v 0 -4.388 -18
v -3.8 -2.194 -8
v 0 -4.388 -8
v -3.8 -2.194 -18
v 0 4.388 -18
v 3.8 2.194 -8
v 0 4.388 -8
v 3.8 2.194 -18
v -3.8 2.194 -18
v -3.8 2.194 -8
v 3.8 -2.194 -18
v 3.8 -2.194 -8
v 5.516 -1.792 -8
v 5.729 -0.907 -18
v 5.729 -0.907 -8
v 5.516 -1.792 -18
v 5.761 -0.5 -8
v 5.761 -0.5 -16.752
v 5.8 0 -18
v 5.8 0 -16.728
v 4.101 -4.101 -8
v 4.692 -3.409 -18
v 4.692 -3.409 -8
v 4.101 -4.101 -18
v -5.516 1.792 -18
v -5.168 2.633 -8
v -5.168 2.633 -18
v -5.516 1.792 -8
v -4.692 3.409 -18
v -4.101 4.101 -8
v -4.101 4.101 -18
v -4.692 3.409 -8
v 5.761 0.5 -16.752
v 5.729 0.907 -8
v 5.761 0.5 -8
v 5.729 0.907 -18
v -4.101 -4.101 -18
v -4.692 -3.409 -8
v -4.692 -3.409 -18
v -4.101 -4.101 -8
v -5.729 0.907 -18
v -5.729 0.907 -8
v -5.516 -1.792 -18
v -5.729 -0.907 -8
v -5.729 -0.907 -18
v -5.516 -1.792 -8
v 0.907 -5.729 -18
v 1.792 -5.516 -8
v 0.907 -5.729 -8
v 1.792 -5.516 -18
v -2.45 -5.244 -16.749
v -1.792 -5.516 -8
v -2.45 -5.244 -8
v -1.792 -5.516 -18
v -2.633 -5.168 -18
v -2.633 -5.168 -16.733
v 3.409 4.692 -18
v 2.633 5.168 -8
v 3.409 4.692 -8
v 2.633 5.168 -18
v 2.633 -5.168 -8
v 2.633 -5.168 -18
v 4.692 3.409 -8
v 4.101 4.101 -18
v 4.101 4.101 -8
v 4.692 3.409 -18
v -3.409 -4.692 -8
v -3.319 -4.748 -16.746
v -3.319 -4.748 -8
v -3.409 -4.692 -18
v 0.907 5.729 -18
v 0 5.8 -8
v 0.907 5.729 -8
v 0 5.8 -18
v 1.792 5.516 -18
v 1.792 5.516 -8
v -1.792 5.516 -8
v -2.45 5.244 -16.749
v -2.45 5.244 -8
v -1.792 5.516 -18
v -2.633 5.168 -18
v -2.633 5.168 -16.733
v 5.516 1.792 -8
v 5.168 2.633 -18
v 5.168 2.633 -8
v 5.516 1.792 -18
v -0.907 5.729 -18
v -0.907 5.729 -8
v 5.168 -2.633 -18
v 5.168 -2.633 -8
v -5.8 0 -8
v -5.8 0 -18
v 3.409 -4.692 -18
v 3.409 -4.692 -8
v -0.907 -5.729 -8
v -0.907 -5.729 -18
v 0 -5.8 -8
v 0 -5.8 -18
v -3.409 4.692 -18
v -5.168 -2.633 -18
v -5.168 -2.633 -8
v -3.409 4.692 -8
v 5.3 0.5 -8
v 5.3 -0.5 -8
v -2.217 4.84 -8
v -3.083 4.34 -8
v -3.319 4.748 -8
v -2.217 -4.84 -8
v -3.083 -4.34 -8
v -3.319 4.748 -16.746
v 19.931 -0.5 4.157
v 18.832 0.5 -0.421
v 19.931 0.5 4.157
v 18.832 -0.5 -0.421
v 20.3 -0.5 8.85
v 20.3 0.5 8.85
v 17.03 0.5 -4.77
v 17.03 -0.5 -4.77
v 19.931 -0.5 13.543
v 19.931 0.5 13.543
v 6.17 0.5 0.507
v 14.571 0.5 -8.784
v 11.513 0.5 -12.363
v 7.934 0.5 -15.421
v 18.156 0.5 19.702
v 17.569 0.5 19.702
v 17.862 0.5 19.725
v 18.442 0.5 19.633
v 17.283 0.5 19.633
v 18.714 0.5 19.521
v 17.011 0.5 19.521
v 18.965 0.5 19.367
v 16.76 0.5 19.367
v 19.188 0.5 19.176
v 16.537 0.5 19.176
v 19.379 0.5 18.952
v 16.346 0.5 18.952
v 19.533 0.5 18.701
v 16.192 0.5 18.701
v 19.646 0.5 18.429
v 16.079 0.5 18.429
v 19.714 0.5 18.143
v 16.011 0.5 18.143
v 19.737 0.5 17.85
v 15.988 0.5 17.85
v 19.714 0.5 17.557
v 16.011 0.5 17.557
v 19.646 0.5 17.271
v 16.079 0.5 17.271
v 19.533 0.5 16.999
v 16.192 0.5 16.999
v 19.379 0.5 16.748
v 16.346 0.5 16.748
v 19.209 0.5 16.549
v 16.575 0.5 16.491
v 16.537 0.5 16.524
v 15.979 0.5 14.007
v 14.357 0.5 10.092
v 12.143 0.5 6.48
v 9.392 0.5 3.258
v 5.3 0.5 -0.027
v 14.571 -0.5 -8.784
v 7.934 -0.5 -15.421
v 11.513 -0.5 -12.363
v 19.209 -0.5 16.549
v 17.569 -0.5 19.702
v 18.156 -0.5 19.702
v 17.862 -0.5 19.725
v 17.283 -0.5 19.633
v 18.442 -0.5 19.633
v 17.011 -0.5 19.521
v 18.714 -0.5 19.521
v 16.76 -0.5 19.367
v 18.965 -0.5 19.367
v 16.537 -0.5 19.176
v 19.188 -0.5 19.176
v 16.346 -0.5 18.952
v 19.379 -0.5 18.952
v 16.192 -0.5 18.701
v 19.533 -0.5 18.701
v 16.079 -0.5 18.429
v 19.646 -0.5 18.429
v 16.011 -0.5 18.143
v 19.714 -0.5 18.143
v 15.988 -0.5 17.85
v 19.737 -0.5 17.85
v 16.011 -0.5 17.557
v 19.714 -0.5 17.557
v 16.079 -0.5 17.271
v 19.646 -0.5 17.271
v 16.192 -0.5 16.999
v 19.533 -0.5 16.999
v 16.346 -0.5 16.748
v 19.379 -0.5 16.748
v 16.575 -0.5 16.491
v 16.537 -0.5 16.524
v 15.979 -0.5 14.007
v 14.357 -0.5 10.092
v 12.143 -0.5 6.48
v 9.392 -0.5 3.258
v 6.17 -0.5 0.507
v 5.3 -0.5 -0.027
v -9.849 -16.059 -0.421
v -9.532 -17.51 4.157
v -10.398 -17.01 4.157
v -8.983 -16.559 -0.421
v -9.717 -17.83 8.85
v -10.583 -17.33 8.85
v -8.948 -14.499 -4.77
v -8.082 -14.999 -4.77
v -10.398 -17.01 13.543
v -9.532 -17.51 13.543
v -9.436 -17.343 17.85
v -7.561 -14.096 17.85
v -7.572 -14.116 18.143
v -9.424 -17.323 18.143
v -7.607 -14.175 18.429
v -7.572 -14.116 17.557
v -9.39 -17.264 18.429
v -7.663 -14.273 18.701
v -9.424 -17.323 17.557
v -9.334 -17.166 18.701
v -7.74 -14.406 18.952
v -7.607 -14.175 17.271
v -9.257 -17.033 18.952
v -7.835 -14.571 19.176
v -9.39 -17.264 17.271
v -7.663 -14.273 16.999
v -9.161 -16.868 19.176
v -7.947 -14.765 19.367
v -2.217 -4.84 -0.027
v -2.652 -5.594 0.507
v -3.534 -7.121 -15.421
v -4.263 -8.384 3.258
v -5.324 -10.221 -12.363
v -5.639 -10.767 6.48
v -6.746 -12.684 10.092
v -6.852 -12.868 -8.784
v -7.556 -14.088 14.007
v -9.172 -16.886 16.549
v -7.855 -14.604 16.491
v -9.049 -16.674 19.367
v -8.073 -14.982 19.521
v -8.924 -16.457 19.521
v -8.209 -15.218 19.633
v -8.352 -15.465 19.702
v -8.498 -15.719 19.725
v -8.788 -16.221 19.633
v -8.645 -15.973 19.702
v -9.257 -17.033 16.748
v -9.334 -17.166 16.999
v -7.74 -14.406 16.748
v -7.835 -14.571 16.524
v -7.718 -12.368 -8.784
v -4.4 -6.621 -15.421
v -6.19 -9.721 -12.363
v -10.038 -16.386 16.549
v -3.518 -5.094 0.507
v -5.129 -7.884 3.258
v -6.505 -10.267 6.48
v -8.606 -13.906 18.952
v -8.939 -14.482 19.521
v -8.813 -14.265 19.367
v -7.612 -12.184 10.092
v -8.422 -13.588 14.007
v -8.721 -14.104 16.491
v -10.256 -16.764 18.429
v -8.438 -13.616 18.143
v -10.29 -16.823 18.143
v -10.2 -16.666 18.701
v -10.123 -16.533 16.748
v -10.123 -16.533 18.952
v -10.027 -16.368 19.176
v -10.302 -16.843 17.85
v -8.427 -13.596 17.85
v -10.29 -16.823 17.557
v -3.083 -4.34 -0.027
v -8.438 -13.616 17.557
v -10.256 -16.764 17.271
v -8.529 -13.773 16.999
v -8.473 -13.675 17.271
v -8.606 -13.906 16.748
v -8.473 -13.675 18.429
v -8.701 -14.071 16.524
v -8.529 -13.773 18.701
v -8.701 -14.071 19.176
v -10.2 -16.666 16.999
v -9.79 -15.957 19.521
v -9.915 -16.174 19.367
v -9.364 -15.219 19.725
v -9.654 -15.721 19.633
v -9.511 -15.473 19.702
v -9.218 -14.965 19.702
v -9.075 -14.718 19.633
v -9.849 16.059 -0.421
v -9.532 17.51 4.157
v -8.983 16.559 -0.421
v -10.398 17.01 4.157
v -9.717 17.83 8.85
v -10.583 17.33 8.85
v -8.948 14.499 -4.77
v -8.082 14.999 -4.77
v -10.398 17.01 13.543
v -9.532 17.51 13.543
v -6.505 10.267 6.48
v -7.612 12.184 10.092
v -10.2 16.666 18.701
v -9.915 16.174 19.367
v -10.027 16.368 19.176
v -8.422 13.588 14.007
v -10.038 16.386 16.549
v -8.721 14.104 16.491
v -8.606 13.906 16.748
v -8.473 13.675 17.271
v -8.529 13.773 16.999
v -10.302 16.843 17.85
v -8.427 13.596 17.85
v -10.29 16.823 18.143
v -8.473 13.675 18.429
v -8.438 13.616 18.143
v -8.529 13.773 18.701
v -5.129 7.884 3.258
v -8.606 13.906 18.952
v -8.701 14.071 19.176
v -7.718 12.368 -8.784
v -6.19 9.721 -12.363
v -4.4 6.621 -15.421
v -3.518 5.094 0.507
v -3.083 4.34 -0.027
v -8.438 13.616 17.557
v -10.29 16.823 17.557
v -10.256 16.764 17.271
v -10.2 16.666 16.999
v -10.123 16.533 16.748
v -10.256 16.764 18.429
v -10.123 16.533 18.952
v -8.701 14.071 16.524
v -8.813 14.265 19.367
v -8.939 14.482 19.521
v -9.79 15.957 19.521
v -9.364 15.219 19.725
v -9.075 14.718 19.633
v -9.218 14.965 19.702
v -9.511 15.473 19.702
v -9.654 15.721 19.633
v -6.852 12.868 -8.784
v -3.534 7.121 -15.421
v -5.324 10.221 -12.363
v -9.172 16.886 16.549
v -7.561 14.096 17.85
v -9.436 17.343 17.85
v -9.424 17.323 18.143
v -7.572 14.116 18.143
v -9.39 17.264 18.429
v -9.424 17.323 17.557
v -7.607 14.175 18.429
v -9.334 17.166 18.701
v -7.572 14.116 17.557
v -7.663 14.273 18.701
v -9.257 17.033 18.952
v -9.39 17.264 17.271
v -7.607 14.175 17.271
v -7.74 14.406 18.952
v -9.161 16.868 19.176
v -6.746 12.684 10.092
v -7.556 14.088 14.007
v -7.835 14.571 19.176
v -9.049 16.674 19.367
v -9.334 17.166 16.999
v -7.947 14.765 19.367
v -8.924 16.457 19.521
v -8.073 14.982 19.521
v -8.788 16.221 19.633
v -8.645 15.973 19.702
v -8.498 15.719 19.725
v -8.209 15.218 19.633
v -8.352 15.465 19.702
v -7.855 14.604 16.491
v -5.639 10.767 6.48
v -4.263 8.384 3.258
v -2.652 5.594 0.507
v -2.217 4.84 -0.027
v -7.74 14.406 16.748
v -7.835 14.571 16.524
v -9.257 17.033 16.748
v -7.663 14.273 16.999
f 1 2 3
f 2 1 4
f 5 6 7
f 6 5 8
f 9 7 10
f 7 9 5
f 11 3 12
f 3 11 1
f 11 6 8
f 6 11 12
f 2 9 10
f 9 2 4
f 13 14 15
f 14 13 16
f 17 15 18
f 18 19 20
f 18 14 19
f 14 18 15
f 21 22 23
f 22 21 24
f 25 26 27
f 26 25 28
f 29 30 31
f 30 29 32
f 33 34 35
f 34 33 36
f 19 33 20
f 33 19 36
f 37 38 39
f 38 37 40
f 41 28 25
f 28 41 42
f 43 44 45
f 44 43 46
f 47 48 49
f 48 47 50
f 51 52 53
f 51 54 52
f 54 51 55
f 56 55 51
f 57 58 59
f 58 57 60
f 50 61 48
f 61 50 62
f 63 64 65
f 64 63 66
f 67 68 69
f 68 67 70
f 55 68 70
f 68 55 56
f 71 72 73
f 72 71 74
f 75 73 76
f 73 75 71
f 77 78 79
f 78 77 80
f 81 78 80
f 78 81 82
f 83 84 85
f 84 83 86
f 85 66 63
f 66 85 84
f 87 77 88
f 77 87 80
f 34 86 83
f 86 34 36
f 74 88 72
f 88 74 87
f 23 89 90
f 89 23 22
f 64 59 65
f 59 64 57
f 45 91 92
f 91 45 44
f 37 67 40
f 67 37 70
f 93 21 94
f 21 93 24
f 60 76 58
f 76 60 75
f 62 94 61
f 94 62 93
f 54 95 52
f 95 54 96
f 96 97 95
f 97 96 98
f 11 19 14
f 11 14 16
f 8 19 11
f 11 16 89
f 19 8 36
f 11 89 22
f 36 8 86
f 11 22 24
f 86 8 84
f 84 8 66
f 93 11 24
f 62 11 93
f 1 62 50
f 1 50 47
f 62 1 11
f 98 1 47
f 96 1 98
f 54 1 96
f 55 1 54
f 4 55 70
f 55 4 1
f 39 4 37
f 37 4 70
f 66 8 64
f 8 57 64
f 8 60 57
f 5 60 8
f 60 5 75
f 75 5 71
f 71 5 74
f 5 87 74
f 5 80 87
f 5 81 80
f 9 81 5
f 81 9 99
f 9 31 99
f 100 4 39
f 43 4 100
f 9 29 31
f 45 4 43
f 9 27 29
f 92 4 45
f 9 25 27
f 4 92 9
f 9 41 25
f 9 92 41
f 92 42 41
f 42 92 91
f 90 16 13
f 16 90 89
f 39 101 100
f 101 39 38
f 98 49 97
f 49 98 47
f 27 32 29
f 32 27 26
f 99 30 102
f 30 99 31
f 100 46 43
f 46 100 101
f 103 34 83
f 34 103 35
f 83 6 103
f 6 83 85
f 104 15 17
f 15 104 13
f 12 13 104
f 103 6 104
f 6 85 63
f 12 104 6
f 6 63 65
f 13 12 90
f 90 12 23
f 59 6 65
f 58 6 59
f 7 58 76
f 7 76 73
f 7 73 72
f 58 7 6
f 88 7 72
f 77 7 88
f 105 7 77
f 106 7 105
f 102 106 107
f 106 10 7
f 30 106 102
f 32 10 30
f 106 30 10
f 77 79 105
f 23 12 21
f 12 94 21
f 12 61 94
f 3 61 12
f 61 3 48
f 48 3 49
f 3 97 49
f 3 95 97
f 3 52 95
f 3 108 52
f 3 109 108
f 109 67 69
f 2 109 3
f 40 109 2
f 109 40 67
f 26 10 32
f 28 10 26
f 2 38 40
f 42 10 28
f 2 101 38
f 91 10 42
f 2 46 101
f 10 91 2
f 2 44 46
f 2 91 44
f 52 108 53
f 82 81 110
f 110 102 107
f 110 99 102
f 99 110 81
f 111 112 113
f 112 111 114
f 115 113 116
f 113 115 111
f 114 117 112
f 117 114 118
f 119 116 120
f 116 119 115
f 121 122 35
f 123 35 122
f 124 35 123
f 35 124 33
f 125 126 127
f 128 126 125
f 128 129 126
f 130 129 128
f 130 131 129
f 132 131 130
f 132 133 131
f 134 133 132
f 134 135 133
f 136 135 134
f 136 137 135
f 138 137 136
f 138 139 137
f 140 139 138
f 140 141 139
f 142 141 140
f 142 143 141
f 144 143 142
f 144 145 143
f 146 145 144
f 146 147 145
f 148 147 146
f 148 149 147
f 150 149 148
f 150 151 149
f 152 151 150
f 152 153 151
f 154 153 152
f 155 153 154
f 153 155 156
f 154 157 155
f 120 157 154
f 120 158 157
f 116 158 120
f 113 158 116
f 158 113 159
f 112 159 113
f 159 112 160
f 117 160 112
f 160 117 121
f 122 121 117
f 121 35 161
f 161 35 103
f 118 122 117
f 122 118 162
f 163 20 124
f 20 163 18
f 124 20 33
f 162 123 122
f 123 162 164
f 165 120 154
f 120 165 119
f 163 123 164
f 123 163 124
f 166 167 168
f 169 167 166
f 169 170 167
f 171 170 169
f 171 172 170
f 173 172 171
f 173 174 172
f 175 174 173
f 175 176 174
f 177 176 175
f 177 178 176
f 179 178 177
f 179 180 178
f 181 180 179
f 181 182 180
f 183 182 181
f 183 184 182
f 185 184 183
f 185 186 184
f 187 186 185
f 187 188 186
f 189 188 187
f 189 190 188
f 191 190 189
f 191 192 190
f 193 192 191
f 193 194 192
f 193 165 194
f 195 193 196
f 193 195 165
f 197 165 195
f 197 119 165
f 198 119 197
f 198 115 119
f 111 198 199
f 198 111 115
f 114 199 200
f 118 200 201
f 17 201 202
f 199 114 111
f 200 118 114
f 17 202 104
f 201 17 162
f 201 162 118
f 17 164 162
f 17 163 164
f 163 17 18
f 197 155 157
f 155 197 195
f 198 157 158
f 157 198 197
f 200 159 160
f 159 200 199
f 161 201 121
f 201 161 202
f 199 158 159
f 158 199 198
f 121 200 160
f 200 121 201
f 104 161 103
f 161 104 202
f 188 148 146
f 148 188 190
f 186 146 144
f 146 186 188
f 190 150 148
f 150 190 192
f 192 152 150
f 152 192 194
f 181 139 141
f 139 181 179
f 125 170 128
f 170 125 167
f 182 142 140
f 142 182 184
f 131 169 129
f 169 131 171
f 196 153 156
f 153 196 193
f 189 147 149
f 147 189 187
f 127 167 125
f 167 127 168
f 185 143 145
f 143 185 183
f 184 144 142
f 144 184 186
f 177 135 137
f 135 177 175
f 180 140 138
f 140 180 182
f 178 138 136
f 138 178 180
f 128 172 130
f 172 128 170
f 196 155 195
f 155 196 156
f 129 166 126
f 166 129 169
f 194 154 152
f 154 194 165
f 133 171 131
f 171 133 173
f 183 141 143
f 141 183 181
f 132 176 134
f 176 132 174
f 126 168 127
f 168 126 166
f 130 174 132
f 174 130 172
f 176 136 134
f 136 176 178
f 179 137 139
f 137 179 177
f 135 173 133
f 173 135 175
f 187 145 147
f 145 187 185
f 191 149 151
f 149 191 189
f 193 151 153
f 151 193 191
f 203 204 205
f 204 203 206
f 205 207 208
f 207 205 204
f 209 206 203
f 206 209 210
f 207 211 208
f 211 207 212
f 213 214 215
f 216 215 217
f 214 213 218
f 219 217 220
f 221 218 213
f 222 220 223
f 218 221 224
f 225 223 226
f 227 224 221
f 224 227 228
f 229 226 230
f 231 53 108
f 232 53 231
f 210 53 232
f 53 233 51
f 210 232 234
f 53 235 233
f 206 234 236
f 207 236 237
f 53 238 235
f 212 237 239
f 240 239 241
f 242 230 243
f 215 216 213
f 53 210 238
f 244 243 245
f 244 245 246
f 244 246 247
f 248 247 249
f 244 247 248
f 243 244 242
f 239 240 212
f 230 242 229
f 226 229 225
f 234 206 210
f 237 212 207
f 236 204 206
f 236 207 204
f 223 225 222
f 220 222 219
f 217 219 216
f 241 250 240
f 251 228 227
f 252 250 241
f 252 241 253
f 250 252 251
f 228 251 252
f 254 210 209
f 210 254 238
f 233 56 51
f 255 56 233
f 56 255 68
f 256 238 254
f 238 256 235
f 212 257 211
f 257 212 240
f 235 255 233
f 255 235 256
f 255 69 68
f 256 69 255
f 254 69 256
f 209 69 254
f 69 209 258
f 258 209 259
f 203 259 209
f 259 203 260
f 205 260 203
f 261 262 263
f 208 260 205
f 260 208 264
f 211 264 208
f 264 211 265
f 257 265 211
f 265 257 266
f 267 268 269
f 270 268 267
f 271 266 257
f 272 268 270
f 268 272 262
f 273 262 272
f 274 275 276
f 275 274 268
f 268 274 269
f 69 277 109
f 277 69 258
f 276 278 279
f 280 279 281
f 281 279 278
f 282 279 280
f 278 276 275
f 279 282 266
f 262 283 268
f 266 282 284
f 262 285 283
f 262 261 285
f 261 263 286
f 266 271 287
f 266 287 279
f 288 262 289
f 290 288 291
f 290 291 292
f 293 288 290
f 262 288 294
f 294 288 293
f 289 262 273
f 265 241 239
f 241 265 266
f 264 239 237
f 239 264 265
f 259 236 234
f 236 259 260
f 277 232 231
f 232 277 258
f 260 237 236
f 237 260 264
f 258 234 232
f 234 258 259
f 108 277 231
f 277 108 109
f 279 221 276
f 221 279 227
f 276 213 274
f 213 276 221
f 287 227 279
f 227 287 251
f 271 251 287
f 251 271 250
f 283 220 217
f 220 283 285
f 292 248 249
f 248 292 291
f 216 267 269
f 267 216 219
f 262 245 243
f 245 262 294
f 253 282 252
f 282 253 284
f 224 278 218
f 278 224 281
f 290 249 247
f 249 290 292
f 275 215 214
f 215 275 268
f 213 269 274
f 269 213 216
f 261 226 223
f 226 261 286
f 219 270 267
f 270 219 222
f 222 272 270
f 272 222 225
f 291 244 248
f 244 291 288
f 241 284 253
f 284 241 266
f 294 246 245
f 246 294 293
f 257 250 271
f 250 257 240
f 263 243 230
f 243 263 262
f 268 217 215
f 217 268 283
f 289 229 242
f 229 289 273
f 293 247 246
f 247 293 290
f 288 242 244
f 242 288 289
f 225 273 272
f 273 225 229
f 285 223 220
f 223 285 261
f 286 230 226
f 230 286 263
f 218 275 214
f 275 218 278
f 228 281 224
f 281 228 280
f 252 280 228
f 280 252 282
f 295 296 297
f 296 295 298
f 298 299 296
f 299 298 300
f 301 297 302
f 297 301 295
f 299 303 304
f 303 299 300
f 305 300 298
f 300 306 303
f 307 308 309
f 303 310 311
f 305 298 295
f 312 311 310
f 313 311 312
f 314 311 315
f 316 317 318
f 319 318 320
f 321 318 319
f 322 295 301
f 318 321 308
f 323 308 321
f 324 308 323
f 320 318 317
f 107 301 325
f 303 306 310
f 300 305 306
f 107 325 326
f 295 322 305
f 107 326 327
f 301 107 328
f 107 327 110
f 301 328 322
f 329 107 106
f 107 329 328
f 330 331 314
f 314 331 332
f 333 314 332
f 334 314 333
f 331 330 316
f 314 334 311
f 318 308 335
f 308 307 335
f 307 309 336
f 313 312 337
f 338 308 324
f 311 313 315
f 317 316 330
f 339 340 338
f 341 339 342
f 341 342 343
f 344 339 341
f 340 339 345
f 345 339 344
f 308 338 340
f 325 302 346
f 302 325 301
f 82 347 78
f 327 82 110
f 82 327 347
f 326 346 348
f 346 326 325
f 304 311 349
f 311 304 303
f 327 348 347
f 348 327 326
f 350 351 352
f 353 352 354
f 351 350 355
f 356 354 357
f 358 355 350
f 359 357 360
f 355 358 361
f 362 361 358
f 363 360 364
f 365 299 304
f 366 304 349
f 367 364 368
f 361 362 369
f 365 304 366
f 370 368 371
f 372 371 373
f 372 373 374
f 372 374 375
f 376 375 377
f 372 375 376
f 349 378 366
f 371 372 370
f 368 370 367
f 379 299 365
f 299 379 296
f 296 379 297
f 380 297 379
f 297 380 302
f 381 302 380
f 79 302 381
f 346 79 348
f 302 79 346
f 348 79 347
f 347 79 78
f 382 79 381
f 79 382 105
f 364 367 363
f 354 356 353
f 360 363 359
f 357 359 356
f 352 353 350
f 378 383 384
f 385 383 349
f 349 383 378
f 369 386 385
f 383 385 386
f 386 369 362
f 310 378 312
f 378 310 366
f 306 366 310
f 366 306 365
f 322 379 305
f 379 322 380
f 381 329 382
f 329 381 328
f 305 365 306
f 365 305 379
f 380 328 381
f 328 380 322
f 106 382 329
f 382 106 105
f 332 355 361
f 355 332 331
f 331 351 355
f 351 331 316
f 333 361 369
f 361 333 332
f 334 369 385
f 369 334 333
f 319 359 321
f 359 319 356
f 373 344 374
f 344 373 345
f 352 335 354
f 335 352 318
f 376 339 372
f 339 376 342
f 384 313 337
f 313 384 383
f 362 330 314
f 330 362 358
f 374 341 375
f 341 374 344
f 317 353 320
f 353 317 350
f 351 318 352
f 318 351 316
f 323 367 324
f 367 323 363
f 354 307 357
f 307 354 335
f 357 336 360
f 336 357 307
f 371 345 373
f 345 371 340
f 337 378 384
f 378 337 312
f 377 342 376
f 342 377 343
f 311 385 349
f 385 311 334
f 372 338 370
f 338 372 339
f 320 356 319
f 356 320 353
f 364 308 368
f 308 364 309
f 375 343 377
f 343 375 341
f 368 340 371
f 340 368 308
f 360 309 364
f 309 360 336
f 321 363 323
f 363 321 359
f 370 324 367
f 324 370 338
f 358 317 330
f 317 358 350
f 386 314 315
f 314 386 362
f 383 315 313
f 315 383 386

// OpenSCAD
/*
 * Convertible Pencil Rocket / Pencil Stand
 *
 * by Alex Franke (CodeCreations), Nov 2012
 * http://www.theFrankes.com
 * 
 * Licenced under Creative Commons Attribution - Non-Commercial - Share Alike 3.0 
 * 
 * INSTRUCTIONS: Choose some values in the "User-defined values" section, render, and print. 
 * 
 * v1.00, Nov 28, 2012: Initial Release.
 *
 * TODO: 
 *   * Nothing at this time. 
 */

/////////////////////////////////////////////////////////////////////////////
// User-defined values... 
/////////////////////////////////////////////////////////////////////////////

finThickness     = 1;    // Thickness of fins
finCount         = 3;    // Number of fins
finInset         = 0.5;  // Distance fins are inset from surface
finScale         = 0.75; // Scale the fins larger (>1) or smaller (<1)
pencilInDiameter = 7.6;  // Diameter of pencil (flat to flat for hex) 6.85 == Ticonderoga #2
bandThickness    = 2;    // The maximum thickness of the band the fins are attached to 
bandHeight       = 10;   // The height of the band
bandTranslation  = 8;    // The distance the band is translated toward the top of the fins

$fn              = 40;   // Overall curve quality


/////////////////////////////////////////////////////////////////////////////
// The code... 
/////////////////////////////////////////////////////////////////////////////

rotate([180,0,0]) 
union() {
	translate([0,0,bandTranslation]) 
	difference() {
		cylinder(h=bandHeight, r=pencilInDiameter/2+bandThickness);
	
		translate([0,0,(bandHeight)/2]) 
			rotate([0,0,30]) 
			nut([pencilInDiameter, bandHeight+1]);
	
	}
	
	for( i=[0:finCount-1] ) {
	
		rotate([0,0,(360/finCount)*i]) 
		translate([pencilInDiameter/2+bandThickness-finInset, 0, 0]) 
		rotate([90,0,0]) 
		scale([finScale,finScale,1]) 
		fin(); 
	
	}
}

/////////////////////////////////////////////////////////////////////////////
// Modules... 
/////////////////////////////////////////////////////////////////////////////

module fin() {
	translate([-20,-11.8,0]) 
	union() {
		difference() { 
			cylinder(h=finThickness, r=40, center=true);
			
			translate([0,-18,0]) 
				cylinder(h=finThickness+1, r=36, center=true);
	
			translate([-25,0,0]) 
				cube([90,90,finThickness+1], center=true);

			translate([36,-16,0]) 
				cube([10,10,finThickness+1], center=true);
		}

		translate([36.75,-12,0]) 
			cylinder(h=finThickness, r=2.5, center=true);
	}
}


// Same nutty code I use in my other designs...
// nutSize = [inDiameter,thickness]
module nut( nutSize ) { 
	side = nutSize[0] * tan( 180/6 );
	if ( nutSize[0] * nutSize[1] != 0 ) {
		for ( i = [0 : 2] ) {
			rotate( i*120, [0, 0, 1]) 
				cube( [side, nutSize[0], nutSize[1]], center=true );
		}
	}
}
